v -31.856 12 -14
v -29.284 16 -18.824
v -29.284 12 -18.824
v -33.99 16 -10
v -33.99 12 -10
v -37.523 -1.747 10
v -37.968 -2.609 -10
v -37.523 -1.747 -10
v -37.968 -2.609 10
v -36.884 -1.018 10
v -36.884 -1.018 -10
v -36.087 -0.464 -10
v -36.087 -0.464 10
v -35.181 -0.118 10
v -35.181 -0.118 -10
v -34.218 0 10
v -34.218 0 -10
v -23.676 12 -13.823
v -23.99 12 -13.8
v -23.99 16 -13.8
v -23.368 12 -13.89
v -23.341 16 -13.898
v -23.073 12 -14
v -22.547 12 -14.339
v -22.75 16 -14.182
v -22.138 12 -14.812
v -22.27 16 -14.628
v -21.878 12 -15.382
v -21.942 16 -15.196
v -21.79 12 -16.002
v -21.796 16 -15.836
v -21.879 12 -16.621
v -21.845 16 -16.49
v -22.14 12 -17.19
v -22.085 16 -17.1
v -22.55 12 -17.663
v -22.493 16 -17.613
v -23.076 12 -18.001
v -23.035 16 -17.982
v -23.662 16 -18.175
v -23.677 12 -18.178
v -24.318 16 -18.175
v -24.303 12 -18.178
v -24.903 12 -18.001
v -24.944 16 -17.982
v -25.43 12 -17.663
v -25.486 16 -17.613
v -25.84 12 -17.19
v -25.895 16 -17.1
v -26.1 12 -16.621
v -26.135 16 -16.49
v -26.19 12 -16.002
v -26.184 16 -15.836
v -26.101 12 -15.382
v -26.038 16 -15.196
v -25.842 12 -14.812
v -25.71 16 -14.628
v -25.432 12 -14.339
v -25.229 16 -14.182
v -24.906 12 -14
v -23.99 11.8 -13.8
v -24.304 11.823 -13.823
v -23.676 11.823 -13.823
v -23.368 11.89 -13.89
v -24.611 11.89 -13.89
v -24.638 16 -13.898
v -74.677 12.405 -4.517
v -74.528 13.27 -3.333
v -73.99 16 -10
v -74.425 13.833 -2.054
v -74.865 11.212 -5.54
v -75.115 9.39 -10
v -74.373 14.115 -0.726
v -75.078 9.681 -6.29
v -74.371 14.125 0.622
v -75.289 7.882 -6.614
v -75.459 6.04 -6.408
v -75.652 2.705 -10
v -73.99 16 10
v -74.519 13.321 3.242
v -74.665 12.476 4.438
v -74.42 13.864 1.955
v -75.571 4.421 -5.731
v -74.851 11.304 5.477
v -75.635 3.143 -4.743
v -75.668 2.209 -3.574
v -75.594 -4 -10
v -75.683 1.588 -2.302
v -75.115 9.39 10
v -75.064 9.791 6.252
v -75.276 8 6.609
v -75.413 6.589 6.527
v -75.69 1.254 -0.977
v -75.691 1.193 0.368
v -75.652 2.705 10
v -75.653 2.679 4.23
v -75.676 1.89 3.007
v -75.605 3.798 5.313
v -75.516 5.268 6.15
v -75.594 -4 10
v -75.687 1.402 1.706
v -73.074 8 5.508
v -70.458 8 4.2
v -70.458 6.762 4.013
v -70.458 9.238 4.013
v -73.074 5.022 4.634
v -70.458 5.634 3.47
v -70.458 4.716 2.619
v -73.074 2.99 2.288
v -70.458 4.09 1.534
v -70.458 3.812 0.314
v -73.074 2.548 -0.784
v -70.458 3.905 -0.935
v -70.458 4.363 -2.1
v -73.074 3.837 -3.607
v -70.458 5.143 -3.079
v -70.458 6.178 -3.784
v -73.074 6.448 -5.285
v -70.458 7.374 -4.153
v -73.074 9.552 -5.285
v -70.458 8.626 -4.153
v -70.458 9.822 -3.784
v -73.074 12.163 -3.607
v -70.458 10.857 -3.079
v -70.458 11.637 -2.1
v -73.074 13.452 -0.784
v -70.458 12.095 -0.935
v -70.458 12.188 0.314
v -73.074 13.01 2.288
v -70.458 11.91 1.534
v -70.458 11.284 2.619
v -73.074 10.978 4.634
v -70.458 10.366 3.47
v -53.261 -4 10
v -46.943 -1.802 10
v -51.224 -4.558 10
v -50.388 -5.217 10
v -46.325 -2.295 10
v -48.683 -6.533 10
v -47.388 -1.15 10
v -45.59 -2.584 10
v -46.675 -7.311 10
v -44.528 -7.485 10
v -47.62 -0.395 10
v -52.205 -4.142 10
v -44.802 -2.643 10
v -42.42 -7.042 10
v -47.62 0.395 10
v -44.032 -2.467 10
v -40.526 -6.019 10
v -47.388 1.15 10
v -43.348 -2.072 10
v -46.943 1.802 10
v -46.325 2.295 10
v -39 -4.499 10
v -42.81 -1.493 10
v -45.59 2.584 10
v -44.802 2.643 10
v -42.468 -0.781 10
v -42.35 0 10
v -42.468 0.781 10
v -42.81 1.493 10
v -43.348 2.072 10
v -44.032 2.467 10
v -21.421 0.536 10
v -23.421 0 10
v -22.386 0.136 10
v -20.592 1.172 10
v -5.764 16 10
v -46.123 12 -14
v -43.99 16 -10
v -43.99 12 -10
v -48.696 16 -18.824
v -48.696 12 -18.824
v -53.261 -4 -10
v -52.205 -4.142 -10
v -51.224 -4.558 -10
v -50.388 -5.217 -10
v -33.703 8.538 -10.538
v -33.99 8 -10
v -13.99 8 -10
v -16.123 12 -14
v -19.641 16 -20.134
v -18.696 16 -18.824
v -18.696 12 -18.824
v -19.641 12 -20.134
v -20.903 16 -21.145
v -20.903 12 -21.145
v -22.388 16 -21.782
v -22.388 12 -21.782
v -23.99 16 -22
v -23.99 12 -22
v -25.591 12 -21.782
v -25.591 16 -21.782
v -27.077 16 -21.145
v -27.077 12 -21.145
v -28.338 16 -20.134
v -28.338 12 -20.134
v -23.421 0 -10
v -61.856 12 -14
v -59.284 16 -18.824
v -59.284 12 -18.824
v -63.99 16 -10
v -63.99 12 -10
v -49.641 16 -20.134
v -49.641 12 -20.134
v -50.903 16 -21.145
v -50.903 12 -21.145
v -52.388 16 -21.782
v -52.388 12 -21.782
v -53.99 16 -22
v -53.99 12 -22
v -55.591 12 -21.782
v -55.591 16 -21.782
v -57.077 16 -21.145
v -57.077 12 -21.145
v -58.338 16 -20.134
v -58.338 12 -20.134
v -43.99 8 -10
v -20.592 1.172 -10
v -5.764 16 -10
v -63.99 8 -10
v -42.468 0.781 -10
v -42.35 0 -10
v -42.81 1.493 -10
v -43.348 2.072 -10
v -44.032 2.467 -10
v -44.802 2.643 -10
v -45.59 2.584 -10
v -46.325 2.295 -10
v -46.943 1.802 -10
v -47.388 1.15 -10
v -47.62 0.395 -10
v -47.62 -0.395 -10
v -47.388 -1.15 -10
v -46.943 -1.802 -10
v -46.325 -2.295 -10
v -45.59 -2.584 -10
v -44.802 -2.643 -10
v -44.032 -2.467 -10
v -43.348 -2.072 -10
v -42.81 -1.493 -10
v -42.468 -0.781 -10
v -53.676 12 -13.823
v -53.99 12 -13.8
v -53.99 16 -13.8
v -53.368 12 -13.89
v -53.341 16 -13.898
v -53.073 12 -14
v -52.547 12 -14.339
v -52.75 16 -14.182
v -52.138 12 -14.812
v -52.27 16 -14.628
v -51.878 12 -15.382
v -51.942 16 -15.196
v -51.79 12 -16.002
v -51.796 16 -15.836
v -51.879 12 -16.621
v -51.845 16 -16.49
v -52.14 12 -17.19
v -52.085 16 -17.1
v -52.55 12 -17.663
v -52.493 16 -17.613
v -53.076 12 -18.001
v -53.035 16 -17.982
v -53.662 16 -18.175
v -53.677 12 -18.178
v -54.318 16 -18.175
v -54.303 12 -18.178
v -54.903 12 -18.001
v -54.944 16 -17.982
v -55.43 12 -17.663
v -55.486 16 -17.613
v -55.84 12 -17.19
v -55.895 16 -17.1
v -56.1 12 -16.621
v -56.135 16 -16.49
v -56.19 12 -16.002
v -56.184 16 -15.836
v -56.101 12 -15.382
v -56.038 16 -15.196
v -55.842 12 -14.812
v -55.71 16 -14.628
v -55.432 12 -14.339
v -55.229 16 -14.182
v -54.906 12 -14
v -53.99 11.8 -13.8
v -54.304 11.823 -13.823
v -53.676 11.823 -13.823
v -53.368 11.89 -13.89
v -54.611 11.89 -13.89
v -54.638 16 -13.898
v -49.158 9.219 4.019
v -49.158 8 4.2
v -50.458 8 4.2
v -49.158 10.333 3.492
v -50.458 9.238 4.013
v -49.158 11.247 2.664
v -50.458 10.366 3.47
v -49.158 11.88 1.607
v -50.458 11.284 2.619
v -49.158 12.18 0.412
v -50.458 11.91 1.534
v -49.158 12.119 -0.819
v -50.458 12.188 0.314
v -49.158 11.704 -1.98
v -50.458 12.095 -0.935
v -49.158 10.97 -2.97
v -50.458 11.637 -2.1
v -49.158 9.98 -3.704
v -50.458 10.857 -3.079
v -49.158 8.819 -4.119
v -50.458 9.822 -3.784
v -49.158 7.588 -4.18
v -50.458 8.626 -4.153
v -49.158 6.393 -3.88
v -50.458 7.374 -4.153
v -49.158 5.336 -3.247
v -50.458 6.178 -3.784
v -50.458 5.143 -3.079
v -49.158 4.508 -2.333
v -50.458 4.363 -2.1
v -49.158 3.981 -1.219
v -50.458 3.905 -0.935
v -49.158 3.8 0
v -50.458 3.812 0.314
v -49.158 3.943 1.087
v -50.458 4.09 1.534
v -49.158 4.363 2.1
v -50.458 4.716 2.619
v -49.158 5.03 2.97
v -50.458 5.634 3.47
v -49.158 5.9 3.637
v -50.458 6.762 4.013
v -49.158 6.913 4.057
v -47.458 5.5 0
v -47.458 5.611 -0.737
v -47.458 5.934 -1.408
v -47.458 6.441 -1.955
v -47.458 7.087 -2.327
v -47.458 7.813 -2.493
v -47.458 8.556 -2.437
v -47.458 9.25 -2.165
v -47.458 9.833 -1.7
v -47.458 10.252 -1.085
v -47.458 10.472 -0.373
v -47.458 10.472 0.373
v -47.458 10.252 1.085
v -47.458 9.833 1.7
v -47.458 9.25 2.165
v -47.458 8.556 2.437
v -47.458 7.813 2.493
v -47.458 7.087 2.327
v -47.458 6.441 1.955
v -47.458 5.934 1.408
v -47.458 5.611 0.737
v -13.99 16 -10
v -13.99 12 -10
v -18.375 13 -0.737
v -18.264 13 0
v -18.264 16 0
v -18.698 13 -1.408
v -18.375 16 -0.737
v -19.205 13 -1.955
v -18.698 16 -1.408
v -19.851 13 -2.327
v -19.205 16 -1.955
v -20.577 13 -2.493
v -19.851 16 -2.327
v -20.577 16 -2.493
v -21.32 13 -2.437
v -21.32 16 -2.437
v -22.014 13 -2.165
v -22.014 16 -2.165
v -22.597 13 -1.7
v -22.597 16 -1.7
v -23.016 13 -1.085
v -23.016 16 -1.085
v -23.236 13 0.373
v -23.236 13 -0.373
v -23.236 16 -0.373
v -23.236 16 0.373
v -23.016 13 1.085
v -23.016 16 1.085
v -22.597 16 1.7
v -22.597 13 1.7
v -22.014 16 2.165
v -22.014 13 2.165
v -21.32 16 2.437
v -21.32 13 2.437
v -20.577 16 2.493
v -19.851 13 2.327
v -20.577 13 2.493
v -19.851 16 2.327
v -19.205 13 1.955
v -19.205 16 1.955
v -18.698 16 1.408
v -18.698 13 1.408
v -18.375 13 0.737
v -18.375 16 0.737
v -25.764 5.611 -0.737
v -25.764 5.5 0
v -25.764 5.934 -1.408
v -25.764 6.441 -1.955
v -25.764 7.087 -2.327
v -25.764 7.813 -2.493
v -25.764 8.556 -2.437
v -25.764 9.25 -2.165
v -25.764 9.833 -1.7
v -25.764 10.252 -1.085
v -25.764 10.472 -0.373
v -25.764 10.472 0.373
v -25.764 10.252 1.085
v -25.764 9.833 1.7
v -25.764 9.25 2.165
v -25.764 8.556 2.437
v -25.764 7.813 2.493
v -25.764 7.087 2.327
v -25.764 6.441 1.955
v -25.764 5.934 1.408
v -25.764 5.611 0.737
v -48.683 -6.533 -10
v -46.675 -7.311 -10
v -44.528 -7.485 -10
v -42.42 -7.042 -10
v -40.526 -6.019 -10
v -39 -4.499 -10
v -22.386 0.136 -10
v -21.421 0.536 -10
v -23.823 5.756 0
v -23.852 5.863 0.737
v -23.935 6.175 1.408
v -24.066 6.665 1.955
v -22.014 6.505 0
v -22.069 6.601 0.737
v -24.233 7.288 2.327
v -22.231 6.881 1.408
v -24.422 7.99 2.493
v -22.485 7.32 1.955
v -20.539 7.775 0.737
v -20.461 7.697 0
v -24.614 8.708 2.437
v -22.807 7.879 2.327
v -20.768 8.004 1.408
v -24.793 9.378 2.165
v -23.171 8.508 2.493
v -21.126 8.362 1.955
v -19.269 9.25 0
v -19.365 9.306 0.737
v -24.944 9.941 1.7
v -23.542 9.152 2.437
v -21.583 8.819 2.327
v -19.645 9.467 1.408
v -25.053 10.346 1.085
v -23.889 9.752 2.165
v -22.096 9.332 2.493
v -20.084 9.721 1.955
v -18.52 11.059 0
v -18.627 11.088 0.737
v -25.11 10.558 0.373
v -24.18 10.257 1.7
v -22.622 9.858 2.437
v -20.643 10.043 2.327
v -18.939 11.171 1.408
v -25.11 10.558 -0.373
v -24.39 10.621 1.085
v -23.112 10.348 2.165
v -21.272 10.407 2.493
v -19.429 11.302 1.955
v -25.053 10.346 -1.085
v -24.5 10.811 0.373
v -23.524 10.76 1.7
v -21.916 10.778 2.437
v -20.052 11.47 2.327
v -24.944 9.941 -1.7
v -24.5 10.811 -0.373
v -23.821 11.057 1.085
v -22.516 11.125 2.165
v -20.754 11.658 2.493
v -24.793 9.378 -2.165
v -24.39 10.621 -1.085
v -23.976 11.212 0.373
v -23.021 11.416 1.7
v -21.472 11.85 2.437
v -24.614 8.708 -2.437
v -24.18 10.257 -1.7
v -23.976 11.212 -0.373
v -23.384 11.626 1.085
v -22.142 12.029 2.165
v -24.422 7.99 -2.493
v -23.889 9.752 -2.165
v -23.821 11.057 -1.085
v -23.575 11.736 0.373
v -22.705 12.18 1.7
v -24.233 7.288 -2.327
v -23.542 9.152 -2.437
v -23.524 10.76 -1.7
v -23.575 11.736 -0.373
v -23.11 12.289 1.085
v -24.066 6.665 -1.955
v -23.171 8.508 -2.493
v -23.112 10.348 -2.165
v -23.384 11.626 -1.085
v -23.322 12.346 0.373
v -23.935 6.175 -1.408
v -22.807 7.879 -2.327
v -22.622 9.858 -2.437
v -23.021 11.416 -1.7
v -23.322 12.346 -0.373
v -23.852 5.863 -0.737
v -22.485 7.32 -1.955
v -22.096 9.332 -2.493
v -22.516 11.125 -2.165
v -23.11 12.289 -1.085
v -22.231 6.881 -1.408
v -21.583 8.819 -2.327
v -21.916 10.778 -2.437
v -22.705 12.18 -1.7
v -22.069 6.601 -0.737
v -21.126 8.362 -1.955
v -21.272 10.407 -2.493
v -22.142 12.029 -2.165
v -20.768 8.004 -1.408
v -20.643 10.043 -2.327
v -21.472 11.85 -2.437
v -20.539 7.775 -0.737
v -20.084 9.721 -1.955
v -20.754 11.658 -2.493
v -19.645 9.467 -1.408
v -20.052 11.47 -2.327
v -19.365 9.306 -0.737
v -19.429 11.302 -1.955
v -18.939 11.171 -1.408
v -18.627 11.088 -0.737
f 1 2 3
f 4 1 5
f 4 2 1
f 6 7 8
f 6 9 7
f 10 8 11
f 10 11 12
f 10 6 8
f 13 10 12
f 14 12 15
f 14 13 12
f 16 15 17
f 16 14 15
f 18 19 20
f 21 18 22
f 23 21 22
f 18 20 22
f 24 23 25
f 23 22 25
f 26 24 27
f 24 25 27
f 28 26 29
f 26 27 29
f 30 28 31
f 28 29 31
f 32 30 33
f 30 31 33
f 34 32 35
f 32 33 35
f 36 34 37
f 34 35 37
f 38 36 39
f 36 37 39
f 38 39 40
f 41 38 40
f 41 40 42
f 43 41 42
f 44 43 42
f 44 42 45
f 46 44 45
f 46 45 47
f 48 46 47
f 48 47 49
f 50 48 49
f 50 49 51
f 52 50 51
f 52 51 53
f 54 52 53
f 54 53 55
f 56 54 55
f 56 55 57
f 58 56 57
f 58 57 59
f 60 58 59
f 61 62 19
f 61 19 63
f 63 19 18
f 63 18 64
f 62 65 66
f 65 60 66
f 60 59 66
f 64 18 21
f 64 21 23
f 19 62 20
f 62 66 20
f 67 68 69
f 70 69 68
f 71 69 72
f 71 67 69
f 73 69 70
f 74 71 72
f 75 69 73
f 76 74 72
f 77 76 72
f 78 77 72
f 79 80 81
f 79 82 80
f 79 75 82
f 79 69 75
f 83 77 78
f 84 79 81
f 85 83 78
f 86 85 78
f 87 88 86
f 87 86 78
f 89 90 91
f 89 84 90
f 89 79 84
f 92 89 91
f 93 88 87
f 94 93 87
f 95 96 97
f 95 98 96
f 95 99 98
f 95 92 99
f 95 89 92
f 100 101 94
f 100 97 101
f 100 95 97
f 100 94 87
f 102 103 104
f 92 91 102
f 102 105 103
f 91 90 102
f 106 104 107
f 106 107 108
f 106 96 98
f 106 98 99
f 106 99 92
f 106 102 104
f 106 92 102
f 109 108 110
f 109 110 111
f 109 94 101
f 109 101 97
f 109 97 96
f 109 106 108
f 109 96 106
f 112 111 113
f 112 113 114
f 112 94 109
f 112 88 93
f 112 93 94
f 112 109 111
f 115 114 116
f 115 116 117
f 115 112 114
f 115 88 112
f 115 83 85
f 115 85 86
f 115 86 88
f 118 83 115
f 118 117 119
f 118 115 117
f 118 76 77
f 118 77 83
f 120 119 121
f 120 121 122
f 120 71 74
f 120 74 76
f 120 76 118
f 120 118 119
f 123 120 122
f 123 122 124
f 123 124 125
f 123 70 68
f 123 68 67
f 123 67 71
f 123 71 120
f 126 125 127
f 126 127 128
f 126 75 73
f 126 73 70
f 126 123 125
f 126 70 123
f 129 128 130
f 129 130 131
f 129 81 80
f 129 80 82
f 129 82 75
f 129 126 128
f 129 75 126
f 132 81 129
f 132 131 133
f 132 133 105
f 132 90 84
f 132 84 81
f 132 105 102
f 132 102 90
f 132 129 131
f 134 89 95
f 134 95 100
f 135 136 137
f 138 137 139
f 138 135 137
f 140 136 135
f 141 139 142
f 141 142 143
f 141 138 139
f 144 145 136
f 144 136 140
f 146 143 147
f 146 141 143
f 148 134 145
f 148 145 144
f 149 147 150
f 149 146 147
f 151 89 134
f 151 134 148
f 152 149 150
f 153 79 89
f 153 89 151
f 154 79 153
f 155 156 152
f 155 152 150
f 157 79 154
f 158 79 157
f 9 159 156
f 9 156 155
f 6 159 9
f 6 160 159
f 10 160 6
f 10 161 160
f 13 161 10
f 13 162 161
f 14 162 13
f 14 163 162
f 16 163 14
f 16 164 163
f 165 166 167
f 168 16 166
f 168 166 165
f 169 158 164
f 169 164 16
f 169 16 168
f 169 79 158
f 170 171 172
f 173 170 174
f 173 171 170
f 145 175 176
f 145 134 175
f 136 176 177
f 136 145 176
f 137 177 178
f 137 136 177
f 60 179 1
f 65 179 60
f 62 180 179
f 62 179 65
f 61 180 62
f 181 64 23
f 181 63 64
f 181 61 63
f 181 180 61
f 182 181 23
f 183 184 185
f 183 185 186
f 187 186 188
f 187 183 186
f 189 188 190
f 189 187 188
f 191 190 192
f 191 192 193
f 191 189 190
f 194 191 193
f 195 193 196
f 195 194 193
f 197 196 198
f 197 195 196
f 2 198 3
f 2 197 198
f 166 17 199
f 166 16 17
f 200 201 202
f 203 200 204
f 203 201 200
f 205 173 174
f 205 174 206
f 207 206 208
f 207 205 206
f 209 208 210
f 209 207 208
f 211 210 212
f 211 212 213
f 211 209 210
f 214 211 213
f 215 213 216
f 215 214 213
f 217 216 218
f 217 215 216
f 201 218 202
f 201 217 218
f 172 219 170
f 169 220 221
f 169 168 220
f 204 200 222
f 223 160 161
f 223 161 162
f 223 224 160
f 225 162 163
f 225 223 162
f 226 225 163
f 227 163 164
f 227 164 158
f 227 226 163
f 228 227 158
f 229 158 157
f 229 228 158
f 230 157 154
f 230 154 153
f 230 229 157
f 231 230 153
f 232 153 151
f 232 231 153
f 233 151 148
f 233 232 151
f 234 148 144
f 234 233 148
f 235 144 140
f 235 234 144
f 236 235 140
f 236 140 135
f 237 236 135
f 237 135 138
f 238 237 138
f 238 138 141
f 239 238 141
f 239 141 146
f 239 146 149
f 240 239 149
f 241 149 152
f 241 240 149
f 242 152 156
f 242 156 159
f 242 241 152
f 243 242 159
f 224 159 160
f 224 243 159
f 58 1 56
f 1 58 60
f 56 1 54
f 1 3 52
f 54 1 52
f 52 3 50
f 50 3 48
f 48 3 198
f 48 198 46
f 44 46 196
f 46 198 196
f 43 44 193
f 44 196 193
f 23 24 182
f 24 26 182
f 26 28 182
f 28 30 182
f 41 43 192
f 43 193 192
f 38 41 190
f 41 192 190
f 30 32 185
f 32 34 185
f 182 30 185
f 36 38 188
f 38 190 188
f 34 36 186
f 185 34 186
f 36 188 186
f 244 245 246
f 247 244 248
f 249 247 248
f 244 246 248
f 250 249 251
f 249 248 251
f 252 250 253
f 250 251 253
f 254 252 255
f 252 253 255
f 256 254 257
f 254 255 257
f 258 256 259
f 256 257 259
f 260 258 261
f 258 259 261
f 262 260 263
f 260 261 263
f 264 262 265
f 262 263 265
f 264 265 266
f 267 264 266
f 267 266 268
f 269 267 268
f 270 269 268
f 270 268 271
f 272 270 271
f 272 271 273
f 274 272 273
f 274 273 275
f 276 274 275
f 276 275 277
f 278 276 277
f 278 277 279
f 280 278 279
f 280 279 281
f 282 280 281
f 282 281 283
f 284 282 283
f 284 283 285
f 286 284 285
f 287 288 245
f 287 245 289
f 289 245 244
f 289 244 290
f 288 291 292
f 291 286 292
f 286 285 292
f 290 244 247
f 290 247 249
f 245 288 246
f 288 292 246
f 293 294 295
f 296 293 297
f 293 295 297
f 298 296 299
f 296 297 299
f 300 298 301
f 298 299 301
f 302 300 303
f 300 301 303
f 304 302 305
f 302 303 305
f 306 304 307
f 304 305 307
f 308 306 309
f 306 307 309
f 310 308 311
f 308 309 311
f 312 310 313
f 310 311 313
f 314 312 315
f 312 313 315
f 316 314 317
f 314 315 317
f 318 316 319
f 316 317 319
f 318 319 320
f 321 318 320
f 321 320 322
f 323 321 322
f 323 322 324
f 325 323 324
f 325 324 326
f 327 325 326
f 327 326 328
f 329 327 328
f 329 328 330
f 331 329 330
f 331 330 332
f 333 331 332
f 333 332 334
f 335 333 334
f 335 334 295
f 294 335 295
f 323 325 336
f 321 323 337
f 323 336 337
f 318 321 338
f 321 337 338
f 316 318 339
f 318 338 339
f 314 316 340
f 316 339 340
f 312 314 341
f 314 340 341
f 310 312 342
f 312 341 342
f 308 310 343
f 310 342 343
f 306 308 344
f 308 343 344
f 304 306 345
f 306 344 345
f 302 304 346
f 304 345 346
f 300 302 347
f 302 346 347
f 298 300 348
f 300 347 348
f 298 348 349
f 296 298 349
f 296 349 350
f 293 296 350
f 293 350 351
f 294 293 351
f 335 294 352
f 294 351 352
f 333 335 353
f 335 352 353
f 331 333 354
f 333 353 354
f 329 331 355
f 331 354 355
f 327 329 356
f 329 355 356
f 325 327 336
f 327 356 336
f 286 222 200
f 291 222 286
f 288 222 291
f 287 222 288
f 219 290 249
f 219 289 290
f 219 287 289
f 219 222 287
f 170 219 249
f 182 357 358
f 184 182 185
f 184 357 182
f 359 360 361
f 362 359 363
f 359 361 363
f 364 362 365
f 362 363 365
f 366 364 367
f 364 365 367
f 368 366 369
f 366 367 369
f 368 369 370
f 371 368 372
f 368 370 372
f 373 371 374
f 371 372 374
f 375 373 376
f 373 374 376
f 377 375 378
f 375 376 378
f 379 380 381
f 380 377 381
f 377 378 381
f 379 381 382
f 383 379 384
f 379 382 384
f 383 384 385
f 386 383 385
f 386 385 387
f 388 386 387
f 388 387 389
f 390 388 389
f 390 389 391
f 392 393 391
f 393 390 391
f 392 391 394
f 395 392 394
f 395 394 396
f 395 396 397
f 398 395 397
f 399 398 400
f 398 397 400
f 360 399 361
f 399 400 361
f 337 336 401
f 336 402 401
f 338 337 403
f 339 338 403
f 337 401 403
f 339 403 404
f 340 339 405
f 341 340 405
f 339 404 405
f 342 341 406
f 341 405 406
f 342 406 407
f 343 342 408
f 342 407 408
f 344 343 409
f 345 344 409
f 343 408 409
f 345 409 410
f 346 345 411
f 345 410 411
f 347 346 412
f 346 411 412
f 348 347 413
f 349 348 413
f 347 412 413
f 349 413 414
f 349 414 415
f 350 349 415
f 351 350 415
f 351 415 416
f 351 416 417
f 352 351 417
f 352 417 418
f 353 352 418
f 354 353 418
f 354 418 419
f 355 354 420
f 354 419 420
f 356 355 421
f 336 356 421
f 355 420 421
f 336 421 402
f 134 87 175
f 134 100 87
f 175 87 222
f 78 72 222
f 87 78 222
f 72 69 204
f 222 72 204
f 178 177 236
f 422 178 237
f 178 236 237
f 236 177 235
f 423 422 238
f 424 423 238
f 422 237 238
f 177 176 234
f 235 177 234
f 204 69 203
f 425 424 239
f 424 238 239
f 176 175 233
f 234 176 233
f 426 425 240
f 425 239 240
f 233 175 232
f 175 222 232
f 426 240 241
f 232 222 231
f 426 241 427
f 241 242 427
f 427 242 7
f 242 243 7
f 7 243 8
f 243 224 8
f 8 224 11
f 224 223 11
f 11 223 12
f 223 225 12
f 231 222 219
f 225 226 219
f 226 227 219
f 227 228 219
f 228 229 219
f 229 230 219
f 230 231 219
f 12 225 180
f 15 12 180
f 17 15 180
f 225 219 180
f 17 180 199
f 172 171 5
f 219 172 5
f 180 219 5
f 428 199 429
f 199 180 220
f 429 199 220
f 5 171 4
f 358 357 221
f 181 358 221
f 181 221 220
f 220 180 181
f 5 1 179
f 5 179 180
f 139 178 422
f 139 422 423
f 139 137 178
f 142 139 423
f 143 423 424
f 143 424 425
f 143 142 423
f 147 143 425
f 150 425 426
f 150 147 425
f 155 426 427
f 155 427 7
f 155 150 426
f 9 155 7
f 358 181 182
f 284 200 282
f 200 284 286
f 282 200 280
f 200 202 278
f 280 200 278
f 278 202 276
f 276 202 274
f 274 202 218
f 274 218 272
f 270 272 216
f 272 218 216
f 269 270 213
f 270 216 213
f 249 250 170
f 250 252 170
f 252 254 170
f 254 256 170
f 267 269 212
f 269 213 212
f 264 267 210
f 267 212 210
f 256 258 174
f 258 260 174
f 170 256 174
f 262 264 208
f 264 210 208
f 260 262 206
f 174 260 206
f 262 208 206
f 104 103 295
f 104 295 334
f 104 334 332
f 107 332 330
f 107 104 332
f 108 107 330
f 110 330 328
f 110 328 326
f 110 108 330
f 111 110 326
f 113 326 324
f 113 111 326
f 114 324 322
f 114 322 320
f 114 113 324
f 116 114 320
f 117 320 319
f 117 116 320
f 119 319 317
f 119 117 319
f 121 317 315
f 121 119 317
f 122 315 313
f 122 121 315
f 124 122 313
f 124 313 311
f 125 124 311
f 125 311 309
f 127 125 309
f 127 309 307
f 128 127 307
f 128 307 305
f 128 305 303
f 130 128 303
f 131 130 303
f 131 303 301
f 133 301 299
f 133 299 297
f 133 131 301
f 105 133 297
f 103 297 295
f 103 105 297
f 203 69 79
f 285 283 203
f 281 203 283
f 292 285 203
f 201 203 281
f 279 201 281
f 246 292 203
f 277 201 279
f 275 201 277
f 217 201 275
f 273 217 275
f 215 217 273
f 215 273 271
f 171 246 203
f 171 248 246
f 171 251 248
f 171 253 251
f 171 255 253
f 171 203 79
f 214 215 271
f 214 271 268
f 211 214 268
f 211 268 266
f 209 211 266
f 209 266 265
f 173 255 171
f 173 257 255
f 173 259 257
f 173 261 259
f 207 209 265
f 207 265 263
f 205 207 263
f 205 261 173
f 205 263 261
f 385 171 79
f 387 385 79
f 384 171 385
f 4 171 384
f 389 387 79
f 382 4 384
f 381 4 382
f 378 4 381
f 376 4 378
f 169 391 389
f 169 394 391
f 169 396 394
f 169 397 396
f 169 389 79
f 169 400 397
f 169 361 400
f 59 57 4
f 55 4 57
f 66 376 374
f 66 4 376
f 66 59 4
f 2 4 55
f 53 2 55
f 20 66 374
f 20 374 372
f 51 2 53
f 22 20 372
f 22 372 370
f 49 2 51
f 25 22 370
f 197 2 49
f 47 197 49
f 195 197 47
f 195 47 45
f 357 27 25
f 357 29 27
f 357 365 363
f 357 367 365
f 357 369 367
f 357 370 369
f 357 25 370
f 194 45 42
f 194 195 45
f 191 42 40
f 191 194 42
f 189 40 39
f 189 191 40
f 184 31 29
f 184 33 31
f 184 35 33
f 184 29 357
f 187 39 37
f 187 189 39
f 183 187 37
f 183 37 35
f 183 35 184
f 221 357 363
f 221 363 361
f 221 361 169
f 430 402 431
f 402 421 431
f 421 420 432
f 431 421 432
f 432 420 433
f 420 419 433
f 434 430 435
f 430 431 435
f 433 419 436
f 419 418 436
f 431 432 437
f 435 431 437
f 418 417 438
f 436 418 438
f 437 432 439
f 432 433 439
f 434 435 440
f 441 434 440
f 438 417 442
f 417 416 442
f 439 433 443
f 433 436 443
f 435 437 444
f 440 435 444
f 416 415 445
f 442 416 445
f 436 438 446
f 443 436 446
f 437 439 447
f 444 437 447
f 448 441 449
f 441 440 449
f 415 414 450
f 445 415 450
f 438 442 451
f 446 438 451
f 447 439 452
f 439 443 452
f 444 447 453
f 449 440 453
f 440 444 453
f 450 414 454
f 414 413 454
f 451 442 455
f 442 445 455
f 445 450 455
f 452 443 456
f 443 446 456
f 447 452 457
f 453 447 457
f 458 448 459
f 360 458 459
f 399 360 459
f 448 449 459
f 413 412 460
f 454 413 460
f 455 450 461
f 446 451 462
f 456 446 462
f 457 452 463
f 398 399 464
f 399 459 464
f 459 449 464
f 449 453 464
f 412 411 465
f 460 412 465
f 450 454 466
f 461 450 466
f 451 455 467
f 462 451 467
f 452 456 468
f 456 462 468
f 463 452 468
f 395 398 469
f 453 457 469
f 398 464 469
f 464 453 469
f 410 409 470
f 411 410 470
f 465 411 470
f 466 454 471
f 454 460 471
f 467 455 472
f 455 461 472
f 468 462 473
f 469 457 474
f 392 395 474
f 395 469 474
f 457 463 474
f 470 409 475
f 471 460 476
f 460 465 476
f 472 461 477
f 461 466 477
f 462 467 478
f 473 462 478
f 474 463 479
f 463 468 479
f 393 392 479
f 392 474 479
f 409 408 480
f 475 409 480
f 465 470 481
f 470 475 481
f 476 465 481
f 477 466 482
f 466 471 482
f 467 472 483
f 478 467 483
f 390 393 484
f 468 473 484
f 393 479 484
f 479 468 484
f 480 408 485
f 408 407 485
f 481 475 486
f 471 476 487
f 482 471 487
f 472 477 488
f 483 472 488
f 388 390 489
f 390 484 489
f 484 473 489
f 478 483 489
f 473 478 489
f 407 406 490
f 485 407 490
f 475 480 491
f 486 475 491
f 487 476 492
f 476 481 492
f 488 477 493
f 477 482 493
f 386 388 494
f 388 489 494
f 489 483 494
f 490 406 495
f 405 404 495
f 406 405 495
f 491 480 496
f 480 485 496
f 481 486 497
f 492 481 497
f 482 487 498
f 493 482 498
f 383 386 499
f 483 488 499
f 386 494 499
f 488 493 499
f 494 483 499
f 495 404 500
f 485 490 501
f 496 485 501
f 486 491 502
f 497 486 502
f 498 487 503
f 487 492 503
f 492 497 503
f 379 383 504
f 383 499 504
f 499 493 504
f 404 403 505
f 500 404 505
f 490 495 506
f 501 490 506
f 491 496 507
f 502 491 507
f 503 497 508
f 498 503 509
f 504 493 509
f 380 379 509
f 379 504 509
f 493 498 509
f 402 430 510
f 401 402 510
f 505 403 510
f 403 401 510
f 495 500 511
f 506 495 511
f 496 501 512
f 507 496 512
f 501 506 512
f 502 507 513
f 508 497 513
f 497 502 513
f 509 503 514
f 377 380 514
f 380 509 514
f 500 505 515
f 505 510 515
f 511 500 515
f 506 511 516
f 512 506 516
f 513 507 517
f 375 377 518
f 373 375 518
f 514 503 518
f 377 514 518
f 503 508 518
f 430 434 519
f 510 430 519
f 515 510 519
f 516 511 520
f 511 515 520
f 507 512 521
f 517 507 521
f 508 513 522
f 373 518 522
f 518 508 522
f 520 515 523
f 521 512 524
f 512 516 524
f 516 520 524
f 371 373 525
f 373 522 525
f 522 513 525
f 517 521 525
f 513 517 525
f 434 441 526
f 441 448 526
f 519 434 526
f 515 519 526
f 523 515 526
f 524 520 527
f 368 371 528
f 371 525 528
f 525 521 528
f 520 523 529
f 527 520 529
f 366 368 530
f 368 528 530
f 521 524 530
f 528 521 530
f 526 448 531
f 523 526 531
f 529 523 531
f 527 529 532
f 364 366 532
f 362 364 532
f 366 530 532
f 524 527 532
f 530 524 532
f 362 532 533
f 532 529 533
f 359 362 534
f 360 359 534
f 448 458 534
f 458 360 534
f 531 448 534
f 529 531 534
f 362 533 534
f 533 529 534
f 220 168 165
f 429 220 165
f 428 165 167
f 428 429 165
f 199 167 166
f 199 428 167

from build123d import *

# Parameters (mm, degrees)
SKETCH2_R           = 2.65
BOSS_EXTRUDE1_DEPTH = 10
SKETCH5_R           = 2.5
CHAMFER1_SIZE       = 3
FILLET4_R           = 4
SKETCH9_R           = 6
SKETCH9_R_2         = 2.2
BOSS_EXTRUDE2_DEPTH = 4
LPATTERN1_COUNT     = 2
LPATTERN1_PITCH     = 30
CHAMFER2_SIZE       = 4


with BuildPart() as part:
    # Sketch2 → Boss-Extrude1 (new, symmetric)
    with BuildSketch(Plane.XY):
        with BuildLine():
            ThreePointArc((-73.989796594, 16), (-75.457580373, 6.053392794), (-75.594245813, -4))
            Line((-75.594245813, -4), (-51.34428877, -4))
            ThreePointArc((-51.34428877, -4), (-42.918193786, -7.205281597), (-37.5, 0))
            Line((-37.5, 0), (-21.763957799, 0))
            Line((-21.763957799, 0), (-5.763957799, 16))
            Line((-5.763957799, 16), (-73.989796594, 16))
        make_face()
        with Locations((-45, 0)):
            Circle(SKETCH2_R, mode=Mode.SUBTRACT)
    extrude(amount=BOSS_EXTRUDE1_DEPTH, both=True)

    # Sketch3 → Cut-Revolve1 (revolve, cut)
    with BuildSketch(Plane.XY, mode=Mode.PRIVATE) as cut_revolve1_sk:
        Polygon((-76.457580373, 8), (-75.457580373, 8), (-50.457580373, 8), (-50.457580373, 12.2), (-70.457580373, 12.2), (-76.457580373, 12.2), align=None)
        Polygon((-76.457580373, 15.2), (-76.457580373, 12.2), (-70.457580373, 12.2), align=None)
    revolve(cut_revolve1_sk.sketch.rotate(Axis((-75.457580373, 8, 0), (1, 0, 0)), 90), axis=Axis((-75.457580373, 8, 0), (1, 0, 0)), mode=Mode.SUBTRACT)

    # Cut-Sweep2: sweep along a path in Sketch7
    with BuildLine(Plane.XY) as cut_sweep2_path:
        Line((-50.457580373, 8), (-25.763957799, 8))
        ThreePointArc((-25.763957799, 8), (-22.228423893, 9.464466094), (-20.763957799, 13))
        Line((-20.763957799, 13), (-20.763957799, 16))
    # Sketch5 → Cut-Sweep2 (sweep, cut)
    with BuildSketch(Plane(origin=(0, 16, 0), x_dir=(1, 0, 0), z_dir=(0, 1, 0))):
        with Locations((-20.763957799, 0)):
            Circle(SKETCH5_R)
    sweep(path=cut_sweep2_path.line, mode=Mode.SUBTRACT)

    # Chamfer1
    # the kernel refuses this chamfer: 3 mm, written as the material it takes off along each edge
    with BuildSketch(Plane(origin=(-50.457580373, 8, 0), x_dir=(0, -1, 0), z_dir=(0, 0, 1))) as chamfer1_piece_1_section:
        Polygon((2.5 + CHAMFER1_SIZE, 0), (2.5, CHAMFER1_SIZE), (2.5, 0), align=None)
    chamfer1_piece_1 = revolve(axis=Axis((-50.457580373, 8, 0), (1, 0, 0)), mode=Mode.PRIVATE)
    chamfer1_piece_1 = chamfer1_piece_1 & Plane(origin=(-48.295596493, 8, 0), x_dir=(0, 0, 1), z_dir=(-1, 0, 0)) * Cylinder(4.2, 22, mode=Mode.PRIVATE)
    add(chamfer1_piece_1, mode=Mode.SUBTRACT)

    # Fillet4
    fillet4_edges = [part.edges().sort_by_distance(p)[0] for p in [
        (-21.763957799, 0, 0),
        (-37.5, 0, 0),
        (-51.34428877, -4, 0),
    ]]
    fillet(fillet4_edges, radius=FILLET4_R)

    # Sketch9 → Boss-Extrude2 (add)
    # profile 1 of 3: a face of its own
    with BuildSketch(Plane(origin=(0, 16, 0), x_dir=(1, 0, 0), z_dir=(0, 1, 0))):
        with Locations((-53.989796594, 16)):
            Circle(SKETCH9_R)
        with Locations(Location((-53.989796594, 16, 0), (0, 0, 270))):
            Circle(SKETCH9_R_2, mode=Mode.SUBTRACT)
    # profile 2 of 3: a face of its own
    with BuildSketch(Plane(origin=(0, 16, 0), x_dir=(1, 0, 0), z_dir=(0, 1, 0))):
        with BuildLine():
            ThreePointArc((-47.989796594, 16), (-49.747155907, 11.757359313), (-53.989796594, 10))
            Line((-53.989796594, 10), (-43.989796594, 10))
            Line((-43.989796594, 10), (-48.695678947, 18.823529412))
            ThreePointArc((-48.695678947, 18.823529412), (-48.168941593, 17.45521375), (-47.989796594, 16))
        make_face()
    # profile 3 of 3: a face of its own
    with BuildSketch(Plane(origin=(0, 16, 0), x_dir=(1, 0, 0), z_dir=(0, 1, 0))):
        with BuildLine():
            Line((-59.283914241, 18.823529412), (-63.989796594, 10))
            Line((-63.989796594, 10), (-53.989796594, 10))
            ThreePointArc((-53.989796594, 10), (-59.134754148, 12.913025467), (-59.283914241, 18.823529412))
        make_face()
    boss_extrude2 = extrude(amount=-BOSS_EXTRUDE2_DEPTH)

    # LPattern1: Boss-Extrude2 ×2
    with Locations(*[(i * LPATTERN1_PITCH, 0, 0) for i in range(1, LPATTERN1_COUNT)]):
        add(boss_extrude2)

    # Chamfer2
    # the kernel refuses this chamfer: 4 mm, written as the material it adds along each edge
    with BuildSketch(Plane(origin=(-33.703064642, 12, -10), x_dir=(0, -0.9996219169112968, 0.027495876610586494), z_dir=(-1, 0, 0))) as chamfer2_piece_1_section:
        Polygon((CHAMFER2_SIZE * 0.999621916911, -CHAMFER2_SIZE * 0.0274958766106), (-CHAMFER2_SIZE * 0.0274958766106, -CHAMFER2_SIZE * 0.999621916911), (0, 0), align=None)
    chamfer2_piece_1 = extrude(amount=40.573463904, mode=Mode.PRIVATE)
    chamfer2_piece_1 = split(chamfer2_piece_1, bisect_by=Plane(origin=(-33.908180605, 9.955648468, -10.153029979), z_dir=(0.882352941176471, 0, 0.4705882352941171)), keep=Keep.TOP, mode=Mode.PRIVATE)
    add(chamfer2_piece_1)
    with BuildSketch(Plane(origin=(-33.703064642, 12, -10), x_dir=(0, -0.9996219169112968, 0.027495876610586494), z_dir=(-1, 0, 0))) as chamfer2_piece_2_section:
        Polygon((CHAMFER2_SIZE * 0.999621916911, -CHAMFER2_SIZE * 0.0274958766106), (-CHAMFER2_SIZE * 0.0274958766106, -CHAMFER2_SIZE * 0.999621916911), (0, 0), align=None)
    chamfer2_piece_2 = extrude(amount=40.573463904, mode=Mode.PRIVATE)
    chamfer2_piece_2 = split(chamfer2_piece_2, bisect_by=Plane(origin=(-61.252355545, 10.648848957, -15.132701966), z_dir=(0.882352941176471, 0, 0.4705882352941171)), keep=Keep.TOP, mode=Mode.PRIVATE)
    chamfer2_piece_2 = split(chamfer2_piece_2, bisect_by=Plane(origin=(-46.727237643, 10.648848957, -15.132701966), z_dir=(-0.8823529411764707, 0, 0.4705882352941174)), keep=Keep.TOP, mode=Mode.PRIVATE)
    chamfer2_piece_2 = chamfer2_piece_2 - Plane(origin=(-53.989796594, 10.648848957, -16), x_dir=(0, 0, 1), z_dir=(0, 1, 0)) * Cylinder(2.2, 98, mode=Mode.PRIVATE)
    add(chamfer2_piece_2)
    with BuildSketch(Plane(origin=(-3.703064642, 12, -10), x_dir=(0, -0.9996219169112968, 0.027495876610586494), z_dir=(-1, 0, 0))) as chamfer2_piece_3_section:
        Polygon((CHAMFER2_SIZE * 0.999621916911, -CHAMFER2_SIZE * 0.0274958766106), (-CHAMFER2_SIZE * 0.0274958766106, -CHAMFER2_SIZE * 0.999621916911), (0, 0), align=None)
    chamfer2_piece_3 = extrude(amount=40.573463904, mode=Mode.PRIVATE)
    chamfer2_piece_3 = split(chamfer2_piece_3, bisect_by=Plane(origin=(-31.252355545, 10.648848957, -15.132701966), z_dir=(0.882352941176471, 0, 0.4705882352941171)), keep=Keep.TOP, mode=Mode.PRIVATE)
    chamfer2_piece_3 = split(chamfer2_piece_3, bisect_by=Plane(origin=(-16.727237643, 10.648848957, -15.132701966), z_dir=(-0.8823529411764707, 0, 0.4705882352941174)), keep=Keep.TOP, mode=Mode.PRIVATE)
    chamfer2_piece_3 = chamfer2_piece_3 - Plane(origin=(-23.989796594, 10.648848957, -16), x_dir=(0, 0, 1), z_dir=(0, 1, 0)) * Cylinder(2.2, 98, mode=Mode.PRIVATE)
    add(chamfer2_piece_3)
    with BuildSketch(Plane(origin=(-3.703064642, 12, -10), x_dir=(0, -0.9996219169112968, 0.027495876610586494), z_dir=(-1, 0, 0))) as chamfer2_piece_4_section:
        Polygon((CHAMFER2_SIZE * 0.999621916911, -CHAMFER2_SIZE * 0.0274958766106), (-CHAMFER2_SIZE * 0.0274958766106, -CHAMFER2_SIZE * 0.999621916911), (0, 0), align=None)
    chamfer2_piece_4 = extrude(amount=40.573463904, mode=Mode.PRIVATE)
    chamfer2_piece_4 = split(chamfer2_piece_4, bisect_by=Plane(origin=(-44.071412583, 9.955648468, -10.153029979), z_dir=(-0.8823529411764707, 0, 0.4705882352941174)), keep=Keep.TOP, mode=Mode.PRIVATE)
    add(chamfer2_piece_4)


solid = part.part
